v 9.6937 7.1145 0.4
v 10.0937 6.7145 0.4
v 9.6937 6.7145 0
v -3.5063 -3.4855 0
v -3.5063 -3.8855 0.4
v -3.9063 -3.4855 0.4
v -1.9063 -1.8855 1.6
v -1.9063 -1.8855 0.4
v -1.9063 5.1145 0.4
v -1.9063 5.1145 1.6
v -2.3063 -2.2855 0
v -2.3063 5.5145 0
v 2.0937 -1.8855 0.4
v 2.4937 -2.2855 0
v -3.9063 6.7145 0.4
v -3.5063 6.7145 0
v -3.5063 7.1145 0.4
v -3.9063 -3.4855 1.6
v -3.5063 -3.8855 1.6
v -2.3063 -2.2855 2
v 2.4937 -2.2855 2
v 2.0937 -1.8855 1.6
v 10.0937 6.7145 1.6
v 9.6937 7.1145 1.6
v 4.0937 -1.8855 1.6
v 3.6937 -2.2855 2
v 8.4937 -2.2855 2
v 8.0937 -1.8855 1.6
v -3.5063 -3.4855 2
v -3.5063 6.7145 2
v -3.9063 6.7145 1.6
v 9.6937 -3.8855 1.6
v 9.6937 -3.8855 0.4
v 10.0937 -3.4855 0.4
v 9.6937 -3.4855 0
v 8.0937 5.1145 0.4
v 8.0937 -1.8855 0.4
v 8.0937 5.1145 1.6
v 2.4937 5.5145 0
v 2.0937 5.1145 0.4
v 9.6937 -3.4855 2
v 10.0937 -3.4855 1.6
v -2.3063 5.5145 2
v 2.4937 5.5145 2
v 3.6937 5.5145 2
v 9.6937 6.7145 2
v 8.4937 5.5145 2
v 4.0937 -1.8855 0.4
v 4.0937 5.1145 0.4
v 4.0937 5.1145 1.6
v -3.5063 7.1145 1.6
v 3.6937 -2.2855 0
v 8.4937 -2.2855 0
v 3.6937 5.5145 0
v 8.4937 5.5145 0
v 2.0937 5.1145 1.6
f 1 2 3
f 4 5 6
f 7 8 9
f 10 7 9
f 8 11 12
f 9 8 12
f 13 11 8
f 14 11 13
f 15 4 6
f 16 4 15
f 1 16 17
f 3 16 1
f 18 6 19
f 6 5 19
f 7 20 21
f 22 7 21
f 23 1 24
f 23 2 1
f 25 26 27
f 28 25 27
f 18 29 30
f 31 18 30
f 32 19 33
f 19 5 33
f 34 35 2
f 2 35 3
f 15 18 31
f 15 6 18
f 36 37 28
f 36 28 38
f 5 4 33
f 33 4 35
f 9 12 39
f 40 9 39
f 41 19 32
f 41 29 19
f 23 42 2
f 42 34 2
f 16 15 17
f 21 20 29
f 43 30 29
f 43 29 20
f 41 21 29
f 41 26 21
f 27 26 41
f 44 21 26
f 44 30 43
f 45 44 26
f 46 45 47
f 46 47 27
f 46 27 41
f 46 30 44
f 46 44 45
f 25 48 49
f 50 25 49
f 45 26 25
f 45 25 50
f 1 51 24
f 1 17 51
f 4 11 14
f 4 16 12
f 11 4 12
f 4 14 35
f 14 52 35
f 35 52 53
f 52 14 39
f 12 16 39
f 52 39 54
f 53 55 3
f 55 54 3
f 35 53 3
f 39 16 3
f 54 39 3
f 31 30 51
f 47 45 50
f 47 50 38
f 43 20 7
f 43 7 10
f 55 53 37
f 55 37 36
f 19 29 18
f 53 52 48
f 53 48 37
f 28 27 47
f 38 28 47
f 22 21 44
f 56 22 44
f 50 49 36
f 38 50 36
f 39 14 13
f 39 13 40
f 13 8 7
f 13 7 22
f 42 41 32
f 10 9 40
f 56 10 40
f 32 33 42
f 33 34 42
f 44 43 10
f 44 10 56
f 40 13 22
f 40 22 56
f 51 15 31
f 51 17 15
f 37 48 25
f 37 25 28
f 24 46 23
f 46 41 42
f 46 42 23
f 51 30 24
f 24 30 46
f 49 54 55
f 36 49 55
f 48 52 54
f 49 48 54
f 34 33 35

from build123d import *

# Parameters (mm, degrees)
F0_W     = 14
F0_H     = 11
F0_W_2   = 4
F0_H_2   = 7
F1_DEPTH = 2
F2_SIZE  = 0.4


with BuildPart() as f1:
    # F0 (on Top) → F1 (new body)
    with BuildSketch(Plane.XY):
        with Locations((3.093662, 1.61453)):
            Rectangle(F0_W, F0_H)
        with Locations((0.093662, 1.61453)):
            Rectangle(F0_W_2, F0_H_2, mode=Mode.SUBTRACT)
        with Locations((6.093662, 1.61453)):
            Rectangle(F0_W_2, F0_H_2, mode=Mode.SUBTRACT)
    extrude(amount=F1_DEPTH)

    # F2
    f2_edges = [f1.edges().sort_by_distance(p)[0] for p in [
        (3.093662, -3.88547, 2),
        (-3.906338, 1.61453, 2),
        (-1.906338, 1.61453, 2),
        (2.093662, 1.61453, 2),
        (4.093662, 1.61453, 2),
        (8.093662, 1.61453, 2),
        (0.093662, 5.11453, 2),
        (0.093662, -1.88547, 2),
        (6.093662, -1.88547, 2),
        (10.093662, 1.61453, 2),
        (3.093662, 7.11453, 2),
        (6.093662, 5.11453, 2),
        (10.093662, 7.11453, 1),
        (-3.906338, 7.11453, 1),
        (10.093662, -3.88547, 1),
        (-3.906338, -3.88547, 1),
        (3.093662, -3.88547, 0),
        (10.093662, 1.61453, 0),
        (8.093662, 1.61453, 0),
        (6.093662, 5.11453, 0),
        (4.093662, 1.61453, 0),
        (6.093662, -1.88547, 0),
        (2.093662, 1.61453, 0),
        (0.093662, 5.11453, 0),
        (0.093662, -1.88547, 0),
        (-1.906338, 1.61453, 0),
        (-3.906338, 1.61453, 0),
        (3.093662, 7.11453, 0),
    ]]
    chamfer(f2_edges, length=F2_SIZE)


solid = f1.part
